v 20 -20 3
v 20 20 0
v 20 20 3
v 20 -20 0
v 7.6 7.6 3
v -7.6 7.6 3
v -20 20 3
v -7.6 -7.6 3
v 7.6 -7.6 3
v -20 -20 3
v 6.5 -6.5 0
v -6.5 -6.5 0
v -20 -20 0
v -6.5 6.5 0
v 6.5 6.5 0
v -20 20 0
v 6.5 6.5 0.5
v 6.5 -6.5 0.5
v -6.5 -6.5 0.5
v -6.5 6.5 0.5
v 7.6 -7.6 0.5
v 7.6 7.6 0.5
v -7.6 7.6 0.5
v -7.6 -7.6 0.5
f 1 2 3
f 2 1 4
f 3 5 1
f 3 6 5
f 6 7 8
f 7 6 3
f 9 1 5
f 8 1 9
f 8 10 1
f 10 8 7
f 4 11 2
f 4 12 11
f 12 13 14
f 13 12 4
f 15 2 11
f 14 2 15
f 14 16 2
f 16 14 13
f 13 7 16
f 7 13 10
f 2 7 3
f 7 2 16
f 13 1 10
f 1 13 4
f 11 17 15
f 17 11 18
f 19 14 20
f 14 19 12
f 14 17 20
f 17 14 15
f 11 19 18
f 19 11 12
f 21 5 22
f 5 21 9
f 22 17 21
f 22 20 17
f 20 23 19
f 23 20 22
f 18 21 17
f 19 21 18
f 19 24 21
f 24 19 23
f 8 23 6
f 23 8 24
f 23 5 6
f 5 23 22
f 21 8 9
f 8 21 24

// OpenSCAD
// design for a sphere holder for Niki's quartz
// grey@mutovis.com
// 12 March 2019

// all dims in mm
major = [40, 40, 3]; // holder outer dims
substrate = [15, 15, 1]; // substrate dimensions
substrate_fudge = 0.2; // manufacturing fudge factor
shelf_thickness = 0.5;
shelf_width = 2;
window = [substrate[0]-shelf_width, substrate[1]-shelf_width];
substrate_fudged = [substrate[0]+substrate_fudge, substrate[1]+substrate_fudge];

module base() {
    difference() {
        translate([-major[0]/2, -major[1]/2, 0]) cube(major);
        translate([-window[0]/2, -window[1]/2, -1]) cube([window[0], window[0],major[2]*2]);
        translate([-substrate_fudged[0]/2, -substrate_fudged[1]/2, shelf_thickness]) cube([substrate_fudged[0], substrate_fudged[1], major[2]*2]);
        }
}

module cap() {
    difference() {
        union(){
            translate([-major[0]/2, -major[1]/2, 0]) cube(major);
            translate([-substrate[0]/2, -substrate[1]/2, 0]) cube([substrate[0], substrate[1], 2*major[2]-shelf_thickness-substrate[2]]);
        }
        translate([-window[0]/2, -window[1]/2, -1]) cube([window[0], window[0],major[2]*2]);
        
    }
}

base();
//cap();
